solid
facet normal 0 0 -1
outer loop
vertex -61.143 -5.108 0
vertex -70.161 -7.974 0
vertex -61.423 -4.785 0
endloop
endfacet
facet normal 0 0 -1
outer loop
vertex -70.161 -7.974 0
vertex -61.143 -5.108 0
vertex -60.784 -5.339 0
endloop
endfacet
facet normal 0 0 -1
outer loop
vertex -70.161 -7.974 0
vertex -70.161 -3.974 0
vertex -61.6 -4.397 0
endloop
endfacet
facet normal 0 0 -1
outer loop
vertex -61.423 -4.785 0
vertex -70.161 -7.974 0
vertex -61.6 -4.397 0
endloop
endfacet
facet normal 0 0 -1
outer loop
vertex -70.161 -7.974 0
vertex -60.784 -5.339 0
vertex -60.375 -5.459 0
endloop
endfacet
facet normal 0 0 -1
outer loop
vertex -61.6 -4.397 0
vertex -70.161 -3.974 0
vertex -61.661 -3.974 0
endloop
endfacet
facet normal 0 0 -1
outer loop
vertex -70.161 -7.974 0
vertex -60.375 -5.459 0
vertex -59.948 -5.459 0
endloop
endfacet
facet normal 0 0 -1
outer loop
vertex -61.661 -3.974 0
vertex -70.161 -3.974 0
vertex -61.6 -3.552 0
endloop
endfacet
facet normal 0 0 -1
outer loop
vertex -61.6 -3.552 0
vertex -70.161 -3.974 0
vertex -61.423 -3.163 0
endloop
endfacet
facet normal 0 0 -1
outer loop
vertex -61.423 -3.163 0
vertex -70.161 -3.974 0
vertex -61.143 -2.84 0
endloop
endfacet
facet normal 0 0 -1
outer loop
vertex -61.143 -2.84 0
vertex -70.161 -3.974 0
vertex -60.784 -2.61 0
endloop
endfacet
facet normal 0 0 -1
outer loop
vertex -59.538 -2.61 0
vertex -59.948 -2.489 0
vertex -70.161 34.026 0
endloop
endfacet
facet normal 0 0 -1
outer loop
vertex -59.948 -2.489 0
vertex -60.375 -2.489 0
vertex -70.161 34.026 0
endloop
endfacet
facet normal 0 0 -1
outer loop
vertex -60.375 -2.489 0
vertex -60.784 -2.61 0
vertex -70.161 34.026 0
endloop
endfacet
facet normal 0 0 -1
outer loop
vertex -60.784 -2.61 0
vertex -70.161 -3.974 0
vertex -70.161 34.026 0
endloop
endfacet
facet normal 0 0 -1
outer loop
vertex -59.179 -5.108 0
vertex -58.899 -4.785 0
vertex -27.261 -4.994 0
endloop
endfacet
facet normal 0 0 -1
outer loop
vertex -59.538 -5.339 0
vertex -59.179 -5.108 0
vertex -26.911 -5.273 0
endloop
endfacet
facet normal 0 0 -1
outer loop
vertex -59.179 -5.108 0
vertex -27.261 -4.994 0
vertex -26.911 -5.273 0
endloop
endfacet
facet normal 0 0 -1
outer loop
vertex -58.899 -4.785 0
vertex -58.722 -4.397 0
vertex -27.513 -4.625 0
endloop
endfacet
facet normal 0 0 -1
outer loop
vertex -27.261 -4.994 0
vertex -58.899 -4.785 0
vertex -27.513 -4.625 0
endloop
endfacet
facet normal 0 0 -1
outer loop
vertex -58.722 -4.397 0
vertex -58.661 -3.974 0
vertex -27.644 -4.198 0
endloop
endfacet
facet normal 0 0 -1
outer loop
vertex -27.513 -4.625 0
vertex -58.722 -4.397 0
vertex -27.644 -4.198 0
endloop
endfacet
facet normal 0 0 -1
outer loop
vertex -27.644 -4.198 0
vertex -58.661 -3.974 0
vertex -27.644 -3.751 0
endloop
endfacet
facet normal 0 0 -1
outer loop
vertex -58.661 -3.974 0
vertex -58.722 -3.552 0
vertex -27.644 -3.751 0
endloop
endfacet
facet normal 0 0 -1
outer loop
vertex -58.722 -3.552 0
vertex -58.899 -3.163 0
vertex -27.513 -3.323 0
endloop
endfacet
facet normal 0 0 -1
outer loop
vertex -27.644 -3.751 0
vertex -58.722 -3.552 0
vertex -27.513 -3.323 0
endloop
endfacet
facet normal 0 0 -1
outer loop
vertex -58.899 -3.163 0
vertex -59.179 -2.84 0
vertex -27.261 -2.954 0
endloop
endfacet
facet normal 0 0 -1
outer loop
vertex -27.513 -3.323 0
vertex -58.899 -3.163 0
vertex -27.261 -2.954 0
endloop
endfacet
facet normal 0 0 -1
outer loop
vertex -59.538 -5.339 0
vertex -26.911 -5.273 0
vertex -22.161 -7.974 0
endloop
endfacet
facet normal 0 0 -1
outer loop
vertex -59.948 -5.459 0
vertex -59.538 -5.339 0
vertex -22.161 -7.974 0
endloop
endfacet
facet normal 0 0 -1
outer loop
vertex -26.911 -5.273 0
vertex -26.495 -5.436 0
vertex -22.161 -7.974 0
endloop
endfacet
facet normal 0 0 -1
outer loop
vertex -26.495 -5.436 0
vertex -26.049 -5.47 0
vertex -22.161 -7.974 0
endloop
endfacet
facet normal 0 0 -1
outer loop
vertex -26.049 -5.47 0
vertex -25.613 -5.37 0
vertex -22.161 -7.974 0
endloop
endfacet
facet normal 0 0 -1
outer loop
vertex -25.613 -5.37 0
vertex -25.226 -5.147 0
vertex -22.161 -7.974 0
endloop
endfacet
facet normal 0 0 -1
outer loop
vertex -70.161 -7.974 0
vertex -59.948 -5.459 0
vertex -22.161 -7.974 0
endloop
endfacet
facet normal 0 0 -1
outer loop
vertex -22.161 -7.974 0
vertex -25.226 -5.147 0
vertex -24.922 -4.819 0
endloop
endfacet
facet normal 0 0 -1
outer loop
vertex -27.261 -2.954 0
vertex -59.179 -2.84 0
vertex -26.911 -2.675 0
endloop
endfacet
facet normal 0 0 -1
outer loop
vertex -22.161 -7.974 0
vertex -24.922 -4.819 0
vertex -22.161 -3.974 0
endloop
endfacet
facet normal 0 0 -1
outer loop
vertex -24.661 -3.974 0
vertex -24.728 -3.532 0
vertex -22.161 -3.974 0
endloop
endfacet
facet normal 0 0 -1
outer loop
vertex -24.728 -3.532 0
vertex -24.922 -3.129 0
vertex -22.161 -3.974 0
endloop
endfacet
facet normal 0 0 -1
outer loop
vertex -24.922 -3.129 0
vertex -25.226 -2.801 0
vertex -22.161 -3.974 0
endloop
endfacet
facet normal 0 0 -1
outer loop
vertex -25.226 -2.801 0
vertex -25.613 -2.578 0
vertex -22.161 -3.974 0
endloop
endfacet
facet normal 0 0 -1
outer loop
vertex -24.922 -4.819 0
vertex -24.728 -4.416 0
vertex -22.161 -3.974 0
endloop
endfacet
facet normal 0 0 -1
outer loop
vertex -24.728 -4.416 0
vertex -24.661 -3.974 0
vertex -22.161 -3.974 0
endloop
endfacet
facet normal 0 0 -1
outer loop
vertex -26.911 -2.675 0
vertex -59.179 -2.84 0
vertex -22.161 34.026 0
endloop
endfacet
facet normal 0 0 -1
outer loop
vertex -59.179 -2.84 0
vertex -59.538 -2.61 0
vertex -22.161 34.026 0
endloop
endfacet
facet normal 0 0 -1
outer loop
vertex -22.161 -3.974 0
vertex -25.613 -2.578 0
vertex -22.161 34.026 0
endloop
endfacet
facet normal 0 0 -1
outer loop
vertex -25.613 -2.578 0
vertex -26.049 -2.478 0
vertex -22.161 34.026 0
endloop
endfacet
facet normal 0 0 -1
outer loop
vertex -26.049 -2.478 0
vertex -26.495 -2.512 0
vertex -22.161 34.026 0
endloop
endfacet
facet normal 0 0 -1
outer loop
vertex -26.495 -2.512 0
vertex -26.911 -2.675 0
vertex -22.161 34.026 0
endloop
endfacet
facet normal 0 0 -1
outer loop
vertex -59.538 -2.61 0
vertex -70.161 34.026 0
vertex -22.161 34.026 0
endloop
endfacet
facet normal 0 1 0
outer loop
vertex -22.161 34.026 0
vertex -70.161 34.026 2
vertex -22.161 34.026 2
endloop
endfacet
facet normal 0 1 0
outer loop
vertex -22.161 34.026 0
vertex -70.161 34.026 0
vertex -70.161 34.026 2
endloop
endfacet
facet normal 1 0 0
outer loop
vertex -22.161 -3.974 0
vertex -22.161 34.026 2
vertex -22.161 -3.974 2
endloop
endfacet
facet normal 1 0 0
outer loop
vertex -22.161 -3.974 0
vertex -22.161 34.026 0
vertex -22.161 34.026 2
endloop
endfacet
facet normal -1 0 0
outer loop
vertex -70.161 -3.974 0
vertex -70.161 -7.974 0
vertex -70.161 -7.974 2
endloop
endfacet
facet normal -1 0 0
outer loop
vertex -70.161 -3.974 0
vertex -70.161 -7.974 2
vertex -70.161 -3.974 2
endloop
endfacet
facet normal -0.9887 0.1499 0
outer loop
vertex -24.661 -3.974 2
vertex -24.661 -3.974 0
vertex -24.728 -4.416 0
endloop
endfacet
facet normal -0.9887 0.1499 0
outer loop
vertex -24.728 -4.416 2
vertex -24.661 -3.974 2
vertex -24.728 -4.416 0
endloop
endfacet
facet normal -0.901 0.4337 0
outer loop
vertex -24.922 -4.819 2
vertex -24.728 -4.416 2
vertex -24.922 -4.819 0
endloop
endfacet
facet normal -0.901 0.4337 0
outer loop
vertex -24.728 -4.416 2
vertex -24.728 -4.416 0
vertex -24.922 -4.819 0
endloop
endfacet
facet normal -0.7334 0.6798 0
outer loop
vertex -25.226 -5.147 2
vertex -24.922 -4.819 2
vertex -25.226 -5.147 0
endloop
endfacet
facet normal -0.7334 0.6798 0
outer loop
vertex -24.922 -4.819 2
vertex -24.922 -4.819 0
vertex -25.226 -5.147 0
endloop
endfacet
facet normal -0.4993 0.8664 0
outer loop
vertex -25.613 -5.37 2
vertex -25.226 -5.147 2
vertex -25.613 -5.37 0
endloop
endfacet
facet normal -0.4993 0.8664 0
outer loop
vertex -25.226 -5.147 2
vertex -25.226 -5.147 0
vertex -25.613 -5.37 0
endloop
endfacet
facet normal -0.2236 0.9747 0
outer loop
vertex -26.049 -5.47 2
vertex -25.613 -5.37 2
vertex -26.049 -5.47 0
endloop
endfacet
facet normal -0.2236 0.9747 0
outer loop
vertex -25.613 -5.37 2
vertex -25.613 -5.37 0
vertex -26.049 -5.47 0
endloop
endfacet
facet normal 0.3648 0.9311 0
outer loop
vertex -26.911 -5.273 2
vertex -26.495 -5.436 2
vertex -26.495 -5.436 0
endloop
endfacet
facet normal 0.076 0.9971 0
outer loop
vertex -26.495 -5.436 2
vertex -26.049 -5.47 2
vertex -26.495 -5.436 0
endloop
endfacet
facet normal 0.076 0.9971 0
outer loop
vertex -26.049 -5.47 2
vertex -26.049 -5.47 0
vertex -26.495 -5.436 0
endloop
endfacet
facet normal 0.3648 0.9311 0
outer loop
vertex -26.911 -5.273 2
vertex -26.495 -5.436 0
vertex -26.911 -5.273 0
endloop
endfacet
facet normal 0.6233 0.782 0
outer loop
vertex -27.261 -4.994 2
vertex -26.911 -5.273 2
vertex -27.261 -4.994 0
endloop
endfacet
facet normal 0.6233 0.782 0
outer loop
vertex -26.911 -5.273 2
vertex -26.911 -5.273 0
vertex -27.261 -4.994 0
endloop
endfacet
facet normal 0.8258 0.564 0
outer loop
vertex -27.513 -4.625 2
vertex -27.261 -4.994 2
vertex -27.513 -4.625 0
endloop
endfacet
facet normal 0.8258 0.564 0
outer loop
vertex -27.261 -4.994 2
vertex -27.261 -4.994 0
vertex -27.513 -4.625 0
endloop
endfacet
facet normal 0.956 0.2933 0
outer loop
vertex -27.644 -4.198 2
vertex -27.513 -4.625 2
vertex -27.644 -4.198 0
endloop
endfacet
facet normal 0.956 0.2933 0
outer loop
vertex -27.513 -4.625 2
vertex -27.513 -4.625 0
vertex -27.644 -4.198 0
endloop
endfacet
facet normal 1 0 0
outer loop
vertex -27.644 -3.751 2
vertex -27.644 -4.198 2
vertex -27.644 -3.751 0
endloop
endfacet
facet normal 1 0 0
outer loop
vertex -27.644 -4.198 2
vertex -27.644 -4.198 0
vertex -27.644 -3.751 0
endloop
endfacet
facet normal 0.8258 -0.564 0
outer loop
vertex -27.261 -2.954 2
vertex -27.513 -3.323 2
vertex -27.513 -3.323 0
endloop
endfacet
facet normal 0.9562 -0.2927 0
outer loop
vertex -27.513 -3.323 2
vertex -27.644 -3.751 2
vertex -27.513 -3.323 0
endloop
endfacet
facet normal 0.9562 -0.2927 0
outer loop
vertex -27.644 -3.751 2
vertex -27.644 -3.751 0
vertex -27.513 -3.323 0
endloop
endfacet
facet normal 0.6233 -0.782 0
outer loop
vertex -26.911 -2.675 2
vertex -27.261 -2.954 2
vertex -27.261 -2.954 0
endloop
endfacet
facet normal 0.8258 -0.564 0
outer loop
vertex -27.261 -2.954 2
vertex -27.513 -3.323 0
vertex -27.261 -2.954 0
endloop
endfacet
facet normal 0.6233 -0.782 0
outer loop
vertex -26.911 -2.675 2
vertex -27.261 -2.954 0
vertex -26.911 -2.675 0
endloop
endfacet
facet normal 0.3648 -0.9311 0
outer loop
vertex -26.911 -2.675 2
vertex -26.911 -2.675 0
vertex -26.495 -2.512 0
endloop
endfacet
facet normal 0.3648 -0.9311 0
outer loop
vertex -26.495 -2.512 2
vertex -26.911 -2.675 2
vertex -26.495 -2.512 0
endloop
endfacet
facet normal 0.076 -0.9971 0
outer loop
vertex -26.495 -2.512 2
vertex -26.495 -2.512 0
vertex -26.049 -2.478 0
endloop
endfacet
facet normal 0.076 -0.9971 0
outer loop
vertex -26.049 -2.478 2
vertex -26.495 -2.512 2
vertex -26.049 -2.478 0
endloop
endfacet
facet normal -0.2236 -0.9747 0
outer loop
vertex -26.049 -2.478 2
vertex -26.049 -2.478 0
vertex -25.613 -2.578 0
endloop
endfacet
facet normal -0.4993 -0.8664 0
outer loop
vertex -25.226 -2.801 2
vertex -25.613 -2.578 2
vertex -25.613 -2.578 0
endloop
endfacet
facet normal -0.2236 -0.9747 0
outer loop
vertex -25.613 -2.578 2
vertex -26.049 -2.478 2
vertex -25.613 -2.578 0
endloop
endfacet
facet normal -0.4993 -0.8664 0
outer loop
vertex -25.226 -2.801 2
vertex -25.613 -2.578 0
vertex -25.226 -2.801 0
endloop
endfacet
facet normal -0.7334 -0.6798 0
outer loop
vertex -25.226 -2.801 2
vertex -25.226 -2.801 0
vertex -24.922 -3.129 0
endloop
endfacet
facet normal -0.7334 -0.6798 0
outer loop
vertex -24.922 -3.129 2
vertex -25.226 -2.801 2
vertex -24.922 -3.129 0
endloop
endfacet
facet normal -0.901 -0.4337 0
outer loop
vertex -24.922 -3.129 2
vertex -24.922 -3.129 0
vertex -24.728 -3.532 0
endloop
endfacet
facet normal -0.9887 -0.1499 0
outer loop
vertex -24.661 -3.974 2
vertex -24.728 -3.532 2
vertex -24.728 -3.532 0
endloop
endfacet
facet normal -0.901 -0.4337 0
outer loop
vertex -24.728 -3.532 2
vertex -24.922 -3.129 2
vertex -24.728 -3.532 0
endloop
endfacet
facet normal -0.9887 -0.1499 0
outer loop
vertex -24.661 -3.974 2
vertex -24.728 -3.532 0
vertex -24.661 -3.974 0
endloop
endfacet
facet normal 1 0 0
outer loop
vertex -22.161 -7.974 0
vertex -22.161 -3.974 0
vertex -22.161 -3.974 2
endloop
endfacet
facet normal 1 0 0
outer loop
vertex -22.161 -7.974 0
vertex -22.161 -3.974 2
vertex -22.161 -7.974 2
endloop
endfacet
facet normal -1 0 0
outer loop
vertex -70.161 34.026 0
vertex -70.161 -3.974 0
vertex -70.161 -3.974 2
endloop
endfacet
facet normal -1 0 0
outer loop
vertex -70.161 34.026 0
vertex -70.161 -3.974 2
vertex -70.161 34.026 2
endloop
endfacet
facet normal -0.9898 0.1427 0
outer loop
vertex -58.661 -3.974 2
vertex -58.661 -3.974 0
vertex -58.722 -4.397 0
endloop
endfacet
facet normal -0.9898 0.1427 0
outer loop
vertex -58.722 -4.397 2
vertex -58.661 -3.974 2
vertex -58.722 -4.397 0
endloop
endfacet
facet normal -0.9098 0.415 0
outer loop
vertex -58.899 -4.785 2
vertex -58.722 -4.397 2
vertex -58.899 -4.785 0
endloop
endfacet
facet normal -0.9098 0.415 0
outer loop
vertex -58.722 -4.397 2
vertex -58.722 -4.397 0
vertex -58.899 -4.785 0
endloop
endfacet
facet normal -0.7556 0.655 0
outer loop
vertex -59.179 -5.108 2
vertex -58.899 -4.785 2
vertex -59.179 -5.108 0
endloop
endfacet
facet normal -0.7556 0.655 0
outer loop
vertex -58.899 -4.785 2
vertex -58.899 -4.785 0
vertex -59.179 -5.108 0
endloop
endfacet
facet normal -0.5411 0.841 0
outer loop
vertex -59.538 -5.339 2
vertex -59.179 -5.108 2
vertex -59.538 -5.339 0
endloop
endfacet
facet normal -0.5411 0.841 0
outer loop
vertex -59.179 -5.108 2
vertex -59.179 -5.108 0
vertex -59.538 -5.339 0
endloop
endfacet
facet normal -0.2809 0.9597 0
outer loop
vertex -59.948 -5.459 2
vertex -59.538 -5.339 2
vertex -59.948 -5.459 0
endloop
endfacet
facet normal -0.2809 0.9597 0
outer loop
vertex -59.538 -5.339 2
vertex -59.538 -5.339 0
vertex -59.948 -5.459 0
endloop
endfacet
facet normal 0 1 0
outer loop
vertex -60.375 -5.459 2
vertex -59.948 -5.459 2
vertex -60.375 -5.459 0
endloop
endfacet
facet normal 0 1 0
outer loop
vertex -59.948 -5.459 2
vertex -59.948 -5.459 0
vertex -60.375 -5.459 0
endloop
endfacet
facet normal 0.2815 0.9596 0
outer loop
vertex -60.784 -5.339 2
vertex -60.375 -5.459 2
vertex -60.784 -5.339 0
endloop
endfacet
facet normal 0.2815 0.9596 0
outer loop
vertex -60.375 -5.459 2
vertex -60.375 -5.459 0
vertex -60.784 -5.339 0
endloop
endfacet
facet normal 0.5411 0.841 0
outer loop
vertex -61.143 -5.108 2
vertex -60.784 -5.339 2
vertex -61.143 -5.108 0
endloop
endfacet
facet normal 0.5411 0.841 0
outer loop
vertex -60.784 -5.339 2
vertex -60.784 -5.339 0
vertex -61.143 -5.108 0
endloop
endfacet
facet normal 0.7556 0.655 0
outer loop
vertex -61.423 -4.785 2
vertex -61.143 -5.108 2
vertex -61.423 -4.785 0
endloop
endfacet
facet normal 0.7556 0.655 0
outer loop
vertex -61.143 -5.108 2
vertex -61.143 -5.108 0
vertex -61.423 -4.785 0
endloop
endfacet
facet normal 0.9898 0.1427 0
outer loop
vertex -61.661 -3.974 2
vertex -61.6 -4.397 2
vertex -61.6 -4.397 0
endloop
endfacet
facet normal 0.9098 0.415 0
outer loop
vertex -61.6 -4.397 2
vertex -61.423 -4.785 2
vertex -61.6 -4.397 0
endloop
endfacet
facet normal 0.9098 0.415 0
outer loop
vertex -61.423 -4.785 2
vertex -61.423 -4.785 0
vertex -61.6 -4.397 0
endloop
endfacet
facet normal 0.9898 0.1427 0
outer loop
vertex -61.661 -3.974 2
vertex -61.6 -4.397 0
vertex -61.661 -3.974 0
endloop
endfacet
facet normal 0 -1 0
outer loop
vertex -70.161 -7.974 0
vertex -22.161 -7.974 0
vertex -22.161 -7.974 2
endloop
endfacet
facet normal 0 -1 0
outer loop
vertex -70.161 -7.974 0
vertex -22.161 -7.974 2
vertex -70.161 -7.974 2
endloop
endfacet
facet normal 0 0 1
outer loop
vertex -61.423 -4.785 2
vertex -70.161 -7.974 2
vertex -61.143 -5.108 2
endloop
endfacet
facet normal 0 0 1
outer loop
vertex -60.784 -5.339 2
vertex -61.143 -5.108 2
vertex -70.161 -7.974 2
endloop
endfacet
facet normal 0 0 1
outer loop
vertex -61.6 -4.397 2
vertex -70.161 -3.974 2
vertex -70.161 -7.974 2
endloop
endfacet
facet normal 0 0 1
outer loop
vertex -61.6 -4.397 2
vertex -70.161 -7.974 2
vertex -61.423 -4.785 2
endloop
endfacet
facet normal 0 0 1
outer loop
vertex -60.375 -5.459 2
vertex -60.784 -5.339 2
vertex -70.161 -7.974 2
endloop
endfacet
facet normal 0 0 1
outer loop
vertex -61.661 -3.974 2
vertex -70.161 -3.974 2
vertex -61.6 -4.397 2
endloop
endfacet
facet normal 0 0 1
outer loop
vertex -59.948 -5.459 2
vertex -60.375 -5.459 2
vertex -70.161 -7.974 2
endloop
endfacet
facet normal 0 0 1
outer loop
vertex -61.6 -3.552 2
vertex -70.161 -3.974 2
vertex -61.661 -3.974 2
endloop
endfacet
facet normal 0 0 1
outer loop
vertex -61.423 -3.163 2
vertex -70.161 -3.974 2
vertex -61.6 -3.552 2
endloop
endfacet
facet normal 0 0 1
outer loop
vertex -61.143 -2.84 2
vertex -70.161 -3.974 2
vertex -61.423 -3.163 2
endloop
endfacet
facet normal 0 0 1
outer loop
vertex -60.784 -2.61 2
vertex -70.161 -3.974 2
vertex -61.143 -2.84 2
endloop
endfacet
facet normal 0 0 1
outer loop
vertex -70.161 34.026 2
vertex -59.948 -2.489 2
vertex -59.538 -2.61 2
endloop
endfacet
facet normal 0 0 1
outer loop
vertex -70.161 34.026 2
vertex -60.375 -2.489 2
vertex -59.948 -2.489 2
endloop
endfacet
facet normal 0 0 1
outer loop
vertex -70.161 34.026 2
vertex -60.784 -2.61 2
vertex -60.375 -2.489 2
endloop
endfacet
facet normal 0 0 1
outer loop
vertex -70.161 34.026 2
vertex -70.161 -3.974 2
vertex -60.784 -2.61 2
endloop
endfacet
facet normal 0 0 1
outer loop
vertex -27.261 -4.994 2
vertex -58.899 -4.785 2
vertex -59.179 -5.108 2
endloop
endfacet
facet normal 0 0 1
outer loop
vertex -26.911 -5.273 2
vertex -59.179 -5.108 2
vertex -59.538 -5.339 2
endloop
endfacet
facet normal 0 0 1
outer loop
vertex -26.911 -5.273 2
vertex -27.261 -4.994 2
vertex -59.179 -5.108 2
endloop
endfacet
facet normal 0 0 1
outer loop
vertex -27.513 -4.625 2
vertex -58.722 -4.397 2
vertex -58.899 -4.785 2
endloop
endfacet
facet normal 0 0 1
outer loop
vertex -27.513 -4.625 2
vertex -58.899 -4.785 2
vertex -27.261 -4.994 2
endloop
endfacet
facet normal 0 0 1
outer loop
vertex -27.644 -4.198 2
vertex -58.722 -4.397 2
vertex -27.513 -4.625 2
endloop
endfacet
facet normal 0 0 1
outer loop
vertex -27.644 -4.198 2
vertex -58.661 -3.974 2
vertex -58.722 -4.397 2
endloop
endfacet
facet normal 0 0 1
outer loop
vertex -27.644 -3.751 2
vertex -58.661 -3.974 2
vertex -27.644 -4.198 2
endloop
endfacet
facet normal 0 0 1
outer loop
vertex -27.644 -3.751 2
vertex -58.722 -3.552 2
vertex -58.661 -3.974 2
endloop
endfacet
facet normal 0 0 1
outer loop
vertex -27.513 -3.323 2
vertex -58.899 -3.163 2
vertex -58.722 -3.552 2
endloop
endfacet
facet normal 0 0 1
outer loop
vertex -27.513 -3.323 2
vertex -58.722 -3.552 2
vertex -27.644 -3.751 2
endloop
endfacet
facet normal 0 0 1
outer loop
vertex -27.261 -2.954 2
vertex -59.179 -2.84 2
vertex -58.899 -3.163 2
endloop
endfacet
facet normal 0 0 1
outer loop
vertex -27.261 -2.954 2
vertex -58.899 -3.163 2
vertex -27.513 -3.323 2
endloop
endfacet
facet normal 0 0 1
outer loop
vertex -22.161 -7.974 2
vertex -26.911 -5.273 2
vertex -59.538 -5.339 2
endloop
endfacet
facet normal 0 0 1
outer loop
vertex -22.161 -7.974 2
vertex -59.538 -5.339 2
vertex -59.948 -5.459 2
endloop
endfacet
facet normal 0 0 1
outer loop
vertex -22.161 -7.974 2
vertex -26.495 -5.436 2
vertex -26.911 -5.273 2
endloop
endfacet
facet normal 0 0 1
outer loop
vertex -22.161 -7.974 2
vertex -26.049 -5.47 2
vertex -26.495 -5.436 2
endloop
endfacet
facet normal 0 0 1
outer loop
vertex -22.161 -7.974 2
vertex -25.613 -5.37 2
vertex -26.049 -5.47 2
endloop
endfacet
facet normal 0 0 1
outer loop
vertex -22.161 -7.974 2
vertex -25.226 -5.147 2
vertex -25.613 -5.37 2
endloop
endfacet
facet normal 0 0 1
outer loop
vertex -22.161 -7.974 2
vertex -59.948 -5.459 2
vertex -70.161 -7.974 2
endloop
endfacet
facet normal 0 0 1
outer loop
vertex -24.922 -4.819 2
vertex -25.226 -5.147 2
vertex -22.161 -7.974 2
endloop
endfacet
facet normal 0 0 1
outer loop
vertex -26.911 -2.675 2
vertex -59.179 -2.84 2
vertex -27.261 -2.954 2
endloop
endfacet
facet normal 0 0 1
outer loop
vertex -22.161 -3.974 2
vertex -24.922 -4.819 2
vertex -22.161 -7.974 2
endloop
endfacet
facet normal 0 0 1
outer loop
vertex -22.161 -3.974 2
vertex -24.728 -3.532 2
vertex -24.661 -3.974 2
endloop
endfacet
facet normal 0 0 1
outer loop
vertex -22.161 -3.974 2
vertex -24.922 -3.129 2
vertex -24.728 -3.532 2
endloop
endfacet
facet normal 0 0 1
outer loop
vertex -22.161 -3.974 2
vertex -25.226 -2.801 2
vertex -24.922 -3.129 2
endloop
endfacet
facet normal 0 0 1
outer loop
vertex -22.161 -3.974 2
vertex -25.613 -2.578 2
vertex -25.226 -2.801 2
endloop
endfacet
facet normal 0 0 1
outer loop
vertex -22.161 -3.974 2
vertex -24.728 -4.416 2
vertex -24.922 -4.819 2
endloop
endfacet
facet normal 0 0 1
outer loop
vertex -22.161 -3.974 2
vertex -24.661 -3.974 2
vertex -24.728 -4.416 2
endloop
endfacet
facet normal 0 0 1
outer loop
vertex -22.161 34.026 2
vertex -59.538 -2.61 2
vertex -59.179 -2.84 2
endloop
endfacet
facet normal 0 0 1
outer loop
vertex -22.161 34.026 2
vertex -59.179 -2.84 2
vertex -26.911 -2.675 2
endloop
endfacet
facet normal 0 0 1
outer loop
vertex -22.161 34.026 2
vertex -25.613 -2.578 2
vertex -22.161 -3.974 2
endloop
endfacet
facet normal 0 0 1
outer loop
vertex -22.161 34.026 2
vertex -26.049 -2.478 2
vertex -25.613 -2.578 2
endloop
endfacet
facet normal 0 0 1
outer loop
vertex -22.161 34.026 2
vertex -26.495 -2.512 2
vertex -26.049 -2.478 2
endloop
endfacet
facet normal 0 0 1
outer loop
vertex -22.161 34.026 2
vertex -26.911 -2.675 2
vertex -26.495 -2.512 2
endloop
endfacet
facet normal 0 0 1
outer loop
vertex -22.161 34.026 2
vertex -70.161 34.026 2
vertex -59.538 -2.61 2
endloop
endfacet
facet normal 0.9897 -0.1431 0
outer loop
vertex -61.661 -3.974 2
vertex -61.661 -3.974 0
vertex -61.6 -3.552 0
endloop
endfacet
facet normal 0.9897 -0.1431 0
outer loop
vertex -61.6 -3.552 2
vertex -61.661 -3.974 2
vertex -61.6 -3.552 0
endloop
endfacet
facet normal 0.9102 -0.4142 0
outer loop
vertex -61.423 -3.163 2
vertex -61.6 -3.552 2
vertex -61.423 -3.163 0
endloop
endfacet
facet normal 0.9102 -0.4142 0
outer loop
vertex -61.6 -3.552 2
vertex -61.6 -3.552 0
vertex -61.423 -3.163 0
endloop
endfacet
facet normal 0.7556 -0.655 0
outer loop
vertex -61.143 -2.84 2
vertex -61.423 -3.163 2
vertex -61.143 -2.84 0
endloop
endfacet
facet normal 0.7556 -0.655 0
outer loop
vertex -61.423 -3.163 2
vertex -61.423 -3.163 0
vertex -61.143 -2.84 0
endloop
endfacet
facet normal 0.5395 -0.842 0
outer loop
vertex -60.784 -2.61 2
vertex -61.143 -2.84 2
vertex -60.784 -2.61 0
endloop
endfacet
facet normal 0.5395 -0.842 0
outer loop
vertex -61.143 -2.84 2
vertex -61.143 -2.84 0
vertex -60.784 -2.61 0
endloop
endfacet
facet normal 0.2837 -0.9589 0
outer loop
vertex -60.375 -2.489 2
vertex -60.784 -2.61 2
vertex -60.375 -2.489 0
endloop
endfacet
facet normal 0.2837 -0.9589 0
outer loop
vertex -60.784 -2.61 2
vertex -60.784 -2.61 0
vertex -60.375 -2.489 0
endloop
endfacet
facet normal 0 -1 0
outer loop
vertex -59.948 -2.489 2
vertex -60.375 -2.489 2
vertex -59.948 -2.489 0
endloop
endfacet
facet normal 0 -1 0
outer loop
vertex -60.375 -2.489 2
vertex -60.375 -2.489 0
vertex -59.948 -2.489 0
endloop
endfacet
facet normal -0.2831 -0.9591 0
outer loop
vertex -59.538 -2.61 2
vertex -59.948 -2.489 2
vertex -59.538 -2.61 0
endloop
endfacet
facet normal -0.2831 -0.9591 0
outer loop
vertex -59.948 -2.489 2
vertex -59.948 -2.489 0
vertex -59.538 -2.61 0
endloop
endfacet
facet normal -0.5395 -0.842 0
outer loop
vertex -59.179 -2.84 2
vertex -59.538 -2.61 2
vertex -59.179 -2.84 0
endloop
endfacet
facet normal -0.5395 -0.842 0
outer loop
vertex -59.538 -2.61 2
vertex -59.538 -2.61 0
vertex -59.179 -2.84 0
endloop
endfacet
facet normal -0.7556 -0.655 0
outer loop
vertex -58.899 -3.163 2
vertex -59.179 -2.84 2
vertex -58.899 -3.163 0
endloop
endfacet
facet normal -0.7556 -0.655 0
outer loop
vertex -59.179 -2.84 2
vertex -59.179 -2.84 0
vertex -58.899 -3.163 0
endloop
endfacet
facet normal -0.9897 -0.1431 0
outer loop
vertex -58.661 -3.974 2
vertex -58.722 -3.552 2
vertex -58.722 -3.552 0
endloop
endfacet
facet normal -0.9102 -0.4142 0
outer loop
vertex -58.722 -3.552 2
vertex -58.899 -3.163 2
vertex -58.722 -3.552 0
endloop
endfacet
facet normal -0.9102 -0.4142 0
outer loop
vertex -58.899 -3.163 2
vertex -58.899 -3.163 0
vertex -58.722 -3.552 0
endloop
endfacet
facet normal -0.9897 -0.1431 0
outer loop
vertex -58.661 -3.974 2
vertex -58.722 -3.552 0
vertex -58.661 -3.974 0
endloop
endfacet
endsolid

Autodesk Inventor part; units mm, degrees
ref_plane "YZ Plane" through (0, 0, 0) normal (1, 0, 0) x (0, 1, 0)
ref_plane "XZ Plane" through (0, 0, 0) normal (0, 1, 0) x (-1, 0, 0)
ref_plane "XY Plane" through (0, 0, 0) normal (0, 0, 1) x (1, 0, 0)
sketch "Sketch2" plane through (0, 0, 0) normal (0, 0, 1) x (1, 0, 0)
  line L0 (-22.1612, -7.9741) -> (-70.1612, -7.9741)
  line L1 (-70.1612, -7.9741) -> (-70.1612, 34.0259)
  line L2 (-70.1612, 34.0259) -> (-22.1612, 34.0259)
  line L3 (-22.1612, 34.0259) -> (-22.1612, -7.9741)
  line L4 (-70.1612, -7.9741) -> (-70.1612, -3.9741)
  line L5 (-70.1612, -3.9741) -> (-60.1612, -3.9741)
  line L6 (-22.1612, -7.9741) -> (-22.1612, -3.9741)
  line L7 (-22.1612, -3.9741) -> (-26.1612, -3.9741)
  circle A0 centre (-60.1612, -3.9741) radius 1.5
  circle A1 centre (-26.1612, -3.9741) radius 1.5
  point P0 (0, 0)
  dimension "d0" = 48
  dimension "d1" = 42
  dimension "d2" = 4
  dimension "d3" = 10
  dimension "d4" = 4
  dimension "d5" = 4
  dimension "d6" = 3
  dimension "d7" = 3
extrude "Extrusion1" add sketch "Sketch2" along normal blind 2
properties part number "driver kort"
